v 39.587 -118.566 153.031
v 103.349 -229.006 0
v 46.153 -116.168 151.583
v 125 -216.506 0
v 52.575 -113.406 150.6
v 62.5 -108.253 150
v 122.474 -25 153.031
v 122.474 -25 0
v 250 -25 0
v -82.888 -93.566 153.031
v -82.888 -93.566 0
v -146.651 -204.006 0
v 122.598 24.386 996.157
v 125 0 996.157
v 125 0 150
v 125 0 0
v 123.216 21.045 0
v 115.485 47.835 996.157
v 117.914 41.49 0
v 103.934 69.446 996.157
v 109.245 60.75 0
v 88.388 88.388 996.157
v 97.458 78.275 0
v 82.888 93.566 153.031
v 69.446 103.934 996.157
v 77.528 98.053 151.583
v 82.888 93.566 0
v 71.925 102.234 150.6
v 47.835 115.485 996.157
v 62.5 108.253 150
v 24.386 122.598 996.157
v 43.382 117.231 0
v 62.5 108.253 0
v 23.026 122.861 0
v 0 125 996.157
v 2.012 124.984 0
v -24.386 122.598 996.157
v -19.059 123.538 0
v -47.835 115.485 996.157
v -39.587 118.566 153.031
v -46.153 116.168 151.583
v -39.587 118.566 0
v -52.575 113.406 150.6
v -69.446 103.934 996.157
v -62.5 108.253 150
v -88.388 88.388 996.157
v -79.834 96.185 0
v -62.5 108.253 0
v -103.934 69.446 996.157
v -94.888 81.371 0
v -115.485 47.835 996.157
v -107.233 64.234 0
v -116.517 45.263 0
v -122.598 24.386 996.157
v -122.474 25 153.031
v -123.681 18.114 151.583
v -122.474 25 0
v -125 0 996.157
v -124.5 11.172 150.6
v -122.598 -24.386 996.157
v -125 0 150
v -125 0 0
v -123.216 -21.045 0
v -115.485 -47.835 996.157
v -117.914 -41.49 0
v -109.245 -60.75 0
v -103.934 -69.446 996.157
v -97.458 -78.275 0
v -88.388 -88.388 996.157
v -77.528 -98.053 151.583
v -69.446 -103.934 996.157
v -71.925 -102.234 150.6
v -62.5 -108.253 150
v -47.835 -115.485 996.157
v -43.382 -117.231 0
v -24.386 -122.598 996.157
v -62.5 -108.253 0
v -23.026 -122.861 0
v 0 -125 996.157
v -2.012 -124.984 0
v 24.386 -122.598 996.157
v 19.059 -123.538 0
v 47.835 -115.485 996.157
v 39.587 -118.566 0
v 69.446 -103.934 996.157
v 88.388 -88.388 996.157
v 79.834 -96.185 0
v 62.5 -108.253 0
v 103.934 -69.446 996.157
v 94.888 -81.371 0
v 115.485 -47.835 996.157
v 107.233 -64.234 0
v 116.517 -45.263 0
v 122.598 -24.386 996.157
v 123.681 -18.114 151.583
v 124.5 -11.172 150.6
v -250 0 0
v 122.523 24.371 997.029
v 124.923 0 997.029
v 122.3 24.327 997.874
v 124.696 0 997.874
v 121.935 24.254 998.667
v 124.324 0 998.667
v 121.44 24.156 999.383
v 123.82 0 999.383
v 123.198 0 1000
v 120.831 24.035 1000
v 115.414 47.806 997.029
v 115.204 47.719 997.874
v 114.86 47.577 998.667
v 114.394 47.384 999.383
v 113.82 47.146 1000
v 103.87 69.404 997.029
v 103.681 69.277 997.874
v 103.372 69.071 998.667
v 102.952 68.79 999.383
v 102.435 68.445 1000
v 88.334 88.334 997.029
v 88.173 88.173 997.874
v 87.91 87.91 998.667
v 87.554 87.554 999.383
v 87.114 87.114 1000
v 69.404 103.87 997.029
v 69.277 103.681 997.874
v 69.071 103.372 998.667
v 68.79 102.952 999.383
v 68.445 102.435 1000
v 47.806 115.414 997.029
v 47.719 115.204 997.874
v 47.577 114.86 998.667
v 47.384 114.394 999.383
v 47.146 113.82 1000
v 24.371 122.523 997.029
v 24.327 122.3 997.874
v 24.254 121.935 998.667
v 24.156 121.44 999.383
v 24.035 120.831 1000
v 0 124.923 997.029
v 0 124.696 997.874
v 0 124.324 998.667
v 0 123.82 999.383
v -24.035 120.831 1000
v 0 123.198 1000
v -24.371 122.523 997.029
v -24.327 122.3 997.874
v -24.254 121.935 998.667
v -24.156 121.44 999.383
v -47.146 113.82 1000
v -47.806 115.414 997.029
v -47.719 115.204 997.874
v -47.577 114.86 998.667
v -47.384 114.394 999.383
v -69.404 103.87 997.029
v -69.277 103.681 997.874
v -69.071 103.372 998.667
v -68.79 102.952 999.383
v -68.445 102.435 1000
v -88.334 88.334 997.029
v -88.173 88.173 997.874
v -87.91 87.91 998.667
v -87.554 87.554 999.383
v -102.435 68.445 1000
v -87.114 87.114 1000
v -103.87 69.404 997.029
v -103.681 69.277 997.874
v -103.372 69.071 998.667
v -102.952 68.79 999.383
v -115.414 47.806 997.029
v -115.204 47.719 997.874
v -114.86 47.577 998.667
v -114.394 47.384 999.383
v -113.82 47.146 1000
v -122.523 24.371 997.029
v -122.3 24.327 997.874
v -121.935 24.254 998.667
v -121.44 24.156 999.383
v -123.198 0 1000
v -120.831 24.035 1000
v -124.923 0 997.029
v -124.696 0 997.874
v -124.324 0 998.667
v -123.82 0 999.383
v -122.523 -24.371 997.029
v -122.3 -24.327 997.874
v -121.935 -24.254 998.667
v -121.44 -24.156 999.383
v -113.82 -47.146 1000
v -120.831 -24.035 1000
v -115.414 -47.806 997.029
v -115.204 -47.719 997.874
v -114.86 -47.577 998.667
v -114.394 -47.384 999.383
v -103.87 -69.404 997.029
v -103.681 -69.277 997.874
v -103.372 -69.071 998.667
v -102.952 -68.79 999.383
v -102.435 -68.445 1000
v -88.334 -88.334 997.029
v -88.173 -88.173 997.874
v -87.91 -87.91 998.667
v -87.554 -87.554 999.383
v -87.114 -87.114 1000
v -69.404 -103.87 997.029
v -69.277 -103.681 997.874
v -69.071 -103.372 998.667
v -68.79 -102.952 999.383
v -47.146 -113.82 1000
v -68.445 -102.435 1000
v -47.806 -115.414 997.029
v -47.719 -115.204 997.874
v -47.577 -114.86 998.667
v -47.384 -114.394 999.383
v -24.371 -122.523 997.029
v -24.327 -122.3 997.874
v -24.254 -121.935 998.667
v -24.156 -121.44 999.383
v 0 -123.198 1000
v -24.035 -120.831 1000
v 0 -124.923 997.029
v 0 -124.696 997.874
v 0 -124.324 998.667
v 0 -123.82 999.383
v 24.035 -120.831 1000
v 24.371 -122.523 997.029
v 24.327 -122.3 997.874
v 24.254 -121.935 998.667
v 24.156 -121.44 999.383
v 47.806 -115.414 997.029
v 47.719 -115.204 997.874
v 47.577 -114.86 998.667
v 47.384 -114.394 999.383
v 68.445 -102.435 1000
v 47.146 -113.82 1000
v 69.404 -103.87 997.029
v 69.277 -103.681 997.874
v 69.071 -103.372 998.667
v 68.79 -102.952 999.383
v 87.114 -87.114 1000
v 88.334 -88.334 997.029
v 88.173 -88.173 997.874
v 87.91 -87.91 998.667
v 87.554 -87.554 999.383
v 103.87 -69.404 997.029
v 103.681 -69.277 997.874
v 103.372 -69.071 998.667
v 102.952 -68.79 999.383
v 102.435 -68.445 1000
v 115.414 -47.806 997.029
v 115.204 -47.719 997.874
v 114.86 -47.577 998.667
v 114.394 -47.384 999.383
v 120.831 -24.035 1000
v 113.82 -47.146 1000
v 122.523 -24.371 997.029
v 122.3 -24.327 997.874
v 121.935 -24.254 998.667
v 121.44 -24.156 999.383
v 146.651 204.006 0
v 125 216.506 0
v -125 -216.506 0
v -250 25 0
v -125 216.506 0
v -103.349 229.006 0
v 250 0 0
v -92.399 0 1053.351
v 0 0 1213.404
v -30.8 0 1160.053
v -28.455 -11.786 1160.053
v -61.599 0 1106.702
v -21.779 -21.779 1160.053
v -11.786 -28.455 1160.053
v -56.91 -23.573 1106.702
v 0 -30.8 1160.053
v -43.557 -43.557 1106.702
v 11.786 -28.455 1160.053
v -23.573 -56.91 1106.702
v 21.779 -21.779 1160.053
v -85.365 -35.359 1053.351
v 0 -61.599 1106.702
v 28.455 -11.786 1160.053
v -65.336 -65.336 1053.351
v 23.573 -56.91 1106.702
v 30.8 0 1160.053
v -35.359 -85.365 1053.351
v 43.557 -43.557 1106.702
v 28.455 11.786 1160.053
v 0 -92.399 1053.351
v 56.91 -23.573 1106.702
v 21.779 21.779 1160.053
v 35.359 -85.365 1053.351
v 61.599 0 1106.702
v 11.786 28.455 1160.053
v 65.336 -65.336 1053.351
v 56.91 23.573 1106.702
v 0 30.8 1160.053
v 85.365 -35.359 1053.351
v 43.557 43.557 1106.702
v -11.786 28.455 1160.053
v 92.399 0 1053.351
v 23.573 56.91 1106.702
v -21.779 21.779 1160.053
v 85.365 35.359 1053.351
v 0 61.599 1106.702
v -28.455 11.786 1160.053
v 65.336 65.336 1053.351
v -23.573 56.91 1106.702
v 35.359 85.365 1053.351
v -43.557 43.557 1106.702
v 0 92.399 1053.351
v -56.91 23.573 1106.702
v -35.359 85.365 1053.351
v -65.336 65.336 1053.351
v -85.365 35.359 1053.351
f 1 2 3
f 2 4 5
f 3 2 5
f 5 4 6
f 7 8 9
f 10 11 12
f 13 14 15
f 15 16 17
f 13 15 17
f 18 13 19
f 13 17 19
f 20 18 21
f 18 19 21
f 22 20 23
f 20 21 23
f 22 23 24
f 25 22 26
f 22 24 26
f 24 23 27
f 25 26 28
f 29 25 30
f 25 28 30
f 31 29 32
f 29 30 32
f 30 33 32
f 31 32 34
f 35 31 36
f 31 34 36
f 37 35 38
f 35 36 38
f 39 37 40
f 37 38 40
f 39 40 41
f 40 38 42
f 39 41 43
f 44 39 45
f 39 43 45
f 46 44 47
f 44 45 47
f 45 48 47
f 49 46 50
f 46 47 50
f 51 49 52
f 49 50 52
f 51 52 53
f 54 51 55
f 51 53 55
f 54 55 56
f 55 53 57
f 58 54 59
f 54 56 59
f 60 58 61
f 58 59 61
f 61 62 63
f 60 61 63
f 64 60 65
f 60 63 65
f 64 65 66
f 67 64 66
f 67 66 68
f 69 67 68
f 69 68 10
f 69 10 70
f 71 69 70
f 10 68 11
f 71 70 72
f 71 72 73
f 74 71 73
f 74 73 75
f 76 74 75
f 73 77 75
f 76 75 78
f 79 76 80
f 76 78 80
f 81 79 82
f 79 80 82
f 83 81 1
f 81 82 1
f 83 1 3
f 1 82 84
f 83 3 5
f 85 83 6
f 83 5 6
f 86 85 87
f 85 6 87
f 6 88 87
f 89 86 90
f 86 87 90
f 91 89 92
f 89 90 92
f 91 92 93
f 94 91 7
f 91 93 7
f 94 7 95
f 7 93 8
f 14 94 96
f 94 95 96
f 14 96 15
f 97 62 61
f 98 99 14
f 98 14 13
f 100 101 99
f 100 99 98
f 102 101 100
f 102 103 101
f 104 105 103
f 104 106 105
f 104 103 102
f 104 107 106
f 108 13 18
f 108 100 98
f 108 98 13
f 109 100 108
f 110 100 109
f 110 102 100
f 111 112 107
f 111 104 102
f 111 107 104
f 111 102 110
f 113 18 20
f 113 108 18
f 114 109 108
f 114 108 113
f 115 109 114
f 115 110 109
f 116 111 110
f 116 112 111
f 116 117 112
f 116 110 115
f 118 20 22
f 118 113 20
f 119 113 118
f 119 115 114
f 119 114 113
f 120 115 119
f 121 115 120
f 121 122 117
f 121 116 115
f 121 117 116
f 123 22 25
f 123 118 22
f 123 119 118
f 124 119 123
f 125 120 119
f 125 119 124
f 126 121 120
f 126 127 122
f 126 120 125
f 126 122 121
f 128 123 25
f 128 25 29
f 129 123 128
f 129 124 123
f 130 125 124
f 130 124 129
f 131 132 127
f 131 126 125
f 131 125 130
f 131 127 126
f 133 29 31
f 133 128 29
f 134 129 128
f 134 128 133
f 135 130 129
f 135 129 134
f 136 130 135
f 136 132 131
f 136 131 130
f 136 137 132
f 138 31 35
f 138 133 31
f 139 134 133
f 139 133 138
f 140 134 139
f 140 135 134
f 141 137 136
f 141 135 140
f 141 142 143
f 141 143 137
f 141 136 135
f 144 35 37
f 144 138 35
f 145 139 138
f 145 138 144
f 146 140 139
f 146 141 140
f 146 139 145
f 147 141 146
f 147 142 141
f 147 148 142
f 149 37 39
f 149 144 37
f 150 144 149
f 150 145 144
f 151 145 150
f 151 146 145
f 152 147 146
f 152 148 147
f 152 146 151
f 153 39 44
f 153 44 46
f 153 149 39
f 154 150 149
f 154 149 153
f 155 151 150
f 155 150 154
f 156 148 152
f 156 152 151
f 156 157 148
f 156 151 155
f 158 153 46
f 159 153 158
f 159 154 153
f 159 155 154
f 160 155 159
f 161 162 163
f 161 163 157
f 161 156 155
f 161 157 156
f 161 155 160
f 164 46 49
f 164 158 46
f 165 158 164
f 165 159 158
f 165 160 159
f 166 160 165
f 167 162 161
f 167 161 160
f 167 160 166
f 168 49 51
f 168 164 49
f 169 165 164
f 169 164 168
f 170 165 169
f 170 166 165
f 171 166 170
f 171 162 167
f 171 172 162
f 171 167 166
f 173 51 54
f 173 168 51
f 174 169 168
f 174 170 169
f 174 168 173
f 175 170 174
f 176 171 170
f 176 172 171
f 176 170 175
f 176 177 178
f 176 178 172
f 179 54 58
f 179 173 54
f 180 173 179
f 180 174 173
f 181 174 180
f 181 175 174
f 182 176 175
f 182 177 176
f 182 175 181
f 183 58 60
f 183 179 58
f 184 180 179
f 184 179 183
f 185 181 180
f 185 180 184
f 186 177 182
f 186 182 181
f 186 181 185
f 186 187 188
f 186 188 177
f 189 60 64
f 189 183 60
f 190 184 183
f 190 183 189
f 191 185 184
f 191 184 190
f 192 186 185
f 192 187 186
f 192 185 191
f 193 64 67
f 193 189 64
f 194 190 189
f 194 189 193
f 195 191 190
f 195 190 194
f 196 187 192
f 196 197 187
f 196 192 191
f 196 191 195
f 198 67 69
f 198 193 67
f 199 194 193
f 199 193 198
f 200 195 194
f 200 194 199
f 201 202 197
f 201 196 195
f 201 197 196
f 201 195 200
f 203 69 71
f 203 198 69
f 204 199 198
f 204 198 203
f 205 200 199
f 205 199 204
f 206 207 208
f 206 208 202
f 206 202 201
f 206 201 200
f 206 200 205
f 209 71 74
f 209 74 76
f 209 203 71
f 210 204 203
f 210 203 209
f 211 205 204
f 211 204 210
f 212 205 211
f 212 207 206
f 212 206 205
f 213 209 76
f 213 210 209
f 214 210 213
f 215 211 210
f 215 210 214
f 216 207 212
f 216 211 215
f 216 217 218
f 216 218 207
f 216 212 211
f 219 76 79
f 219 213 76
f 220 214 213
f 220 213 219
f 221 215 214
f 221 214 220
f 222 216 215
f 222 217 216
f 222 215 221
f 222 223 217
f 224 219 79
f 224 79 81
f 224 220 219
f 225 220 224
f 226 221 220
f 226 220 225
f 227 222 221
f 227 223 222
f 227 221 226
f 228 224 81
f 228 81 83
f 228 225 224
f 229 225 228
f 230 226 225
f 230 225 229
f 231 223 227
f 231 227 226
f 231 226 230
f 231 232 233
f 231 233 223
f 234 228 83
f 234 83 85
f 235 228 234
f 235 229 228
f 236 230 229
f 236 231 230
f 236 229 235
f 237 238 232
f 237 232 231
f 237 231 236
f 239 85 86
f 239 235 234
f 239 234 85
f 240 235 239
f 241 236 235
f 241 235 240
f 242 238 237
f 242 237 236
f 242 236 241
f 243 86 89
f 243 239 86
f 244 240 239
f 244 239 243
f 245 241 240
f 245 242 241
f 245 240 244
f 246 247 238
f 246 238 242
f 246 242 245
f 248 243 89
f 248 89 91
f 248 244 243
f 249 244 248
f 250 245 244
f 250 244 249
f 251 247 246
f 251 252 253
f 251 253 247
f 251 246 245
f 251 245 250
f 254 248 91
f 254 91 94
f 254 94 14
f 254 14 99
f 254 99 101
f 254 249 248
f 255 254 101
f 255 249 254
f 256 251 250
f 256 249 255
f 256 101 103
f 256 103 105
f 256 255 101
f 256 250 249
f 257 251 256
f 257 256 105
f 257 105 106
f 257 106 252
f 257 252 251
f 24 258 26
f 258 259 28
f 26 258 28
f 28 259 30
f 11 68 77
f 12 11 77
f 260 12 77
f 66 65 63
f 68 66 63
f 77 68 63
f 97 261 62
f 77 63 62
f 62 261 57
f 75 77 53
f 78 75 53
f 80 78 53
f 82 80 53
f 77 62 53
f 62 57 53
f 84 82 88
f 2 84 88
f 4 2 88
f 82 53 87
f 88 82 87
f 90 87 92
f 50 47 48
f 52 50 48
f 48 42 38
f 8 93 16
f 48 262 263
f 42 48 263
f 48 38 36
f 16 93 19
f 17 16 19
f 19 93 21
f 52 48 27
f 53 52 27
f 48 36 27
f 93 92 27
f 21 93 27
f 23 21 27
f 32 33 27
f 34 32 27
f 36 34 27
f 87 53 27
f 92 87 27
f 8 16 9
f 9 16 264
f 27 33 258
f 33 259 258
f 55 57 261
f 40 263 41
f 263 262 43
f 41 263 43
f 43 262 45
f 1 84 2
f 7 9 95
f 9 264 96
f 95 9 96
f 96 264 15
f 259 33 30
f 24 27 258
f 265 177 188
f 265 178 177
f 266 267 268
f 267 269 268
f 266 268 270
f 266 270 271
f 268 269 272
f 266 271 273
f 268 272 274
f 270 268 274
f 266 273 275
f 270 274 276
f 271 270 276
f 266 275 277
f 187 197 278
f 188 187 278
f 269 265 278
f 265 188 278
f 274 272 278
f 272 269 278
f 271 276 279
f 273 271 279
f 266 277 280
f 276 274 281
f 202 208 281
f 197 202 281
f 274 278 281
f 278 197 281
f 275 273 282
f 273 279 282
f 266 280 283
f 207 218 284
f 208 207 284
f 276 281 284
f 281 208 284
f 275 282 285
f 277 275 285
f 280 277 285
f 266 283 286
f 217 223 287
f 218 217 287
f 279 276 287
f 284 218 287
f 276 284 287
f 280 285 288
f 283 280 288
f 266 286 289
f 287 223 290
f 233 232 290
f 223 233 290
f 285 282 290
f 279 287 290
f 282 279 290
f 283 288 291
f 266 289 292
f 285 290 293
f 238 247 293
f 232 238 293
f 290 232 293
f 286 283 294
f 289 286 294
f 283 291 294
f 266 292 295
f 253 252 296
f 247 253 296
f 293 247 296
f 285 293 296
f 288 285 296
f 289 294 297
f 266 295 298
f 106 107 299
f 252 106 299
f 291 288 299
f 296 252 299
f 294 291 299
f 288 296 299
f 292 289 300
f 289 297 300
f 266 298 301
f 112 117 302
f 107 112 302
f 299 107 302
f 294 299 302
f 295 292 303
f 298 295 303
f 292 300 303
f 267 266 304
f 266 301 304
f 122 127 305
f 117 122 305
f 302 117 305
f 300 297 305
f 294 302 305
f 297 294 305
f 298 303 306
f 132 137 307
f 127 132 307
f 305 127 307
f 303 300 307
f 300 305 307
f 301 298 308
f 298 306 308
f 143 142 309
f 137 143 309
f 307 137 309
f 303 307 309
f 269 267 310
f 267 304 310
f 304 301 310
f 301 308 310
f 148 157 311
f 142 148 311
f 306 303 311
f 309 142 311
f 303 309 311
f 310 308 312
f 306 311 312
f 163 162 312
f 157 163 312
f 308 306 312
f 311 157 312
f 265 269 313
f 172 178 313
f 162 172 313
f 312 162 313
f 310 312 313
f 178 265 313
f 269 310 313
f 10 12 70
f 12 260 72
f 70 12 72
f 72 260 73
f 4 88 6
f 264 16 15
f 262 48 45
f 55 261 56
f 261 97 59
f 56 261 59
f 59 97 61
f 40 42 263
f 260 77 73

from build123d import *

# Parameters (mm, degrees)
F0_R            = 125
F1_DEPTH        = 1000
F6_DEPTH        = 25
F6_COPIES_COUNT = 6


# Not quite as in the source:
# - a fillet or chamfer that OpenCascade refuses, or shapes differently, is made with other operations: its cross-section is extruded or revolved along the edge and cut away or added
# - a pattern or mirror of a feature is missing from the dataset's text; its kind, count and spacing are read off the source's solid


with BuildPart() as f1:
    # F0 (on Top) → F1 (new body)
    with BuildSketch(Plane.XY):
        Circle(F0_R)
    extrude(amount=F1_DEPTH)

    # F2 (on Front) → F3 (revolve)
    with BuildSketch(Plane.XZ):
        Polygon((-124.5536804199, 997.6518154144), (0, 998.6120462418), (0, 1213.404417038), align=None)
    revolve(axis=Axis((0, 0, 1106.0082316399), (0, 0, 1)))

    # F4: fillet of radius 5 on 1 edges, made by hand

    # F4_s1 → F4_t2 (revolve, cut)
    with BuildSketch(Plane.XZ):
        with BuildLine():
            ThreePointArc((125, 996.1565242927), (124.5271615516, 998.2789776575), (123.1980766857, 1000))
            Line((123.1980766857, 1000), (125, 1000))
            Line((125, 1000), (125, 996.1565242927))
        make_face()
    revolve(axis=Axis((0, 0, 1000), (0, 0, 1)), mode=Mode.SUBTRACT)

    # F5 (on Front) → F6 (join)
    with BuildSketch(Plane.XZ):
        Polygon((0, 300), (0, 0), (250, 0), align=None)
    f6 = extrude(amount=F6_DEPTH)

    # F6_copies: F6 ×6 about axis
    f6_copies_axis = Axis((0, 0, 0), (0, 0, 1))
    for i in range(1, F6_COPIES_COUNT):
        add(f6.rotate(f6_copies_axis, i * 360 / F6_COPIES_COUNT))


solid = f1.part
